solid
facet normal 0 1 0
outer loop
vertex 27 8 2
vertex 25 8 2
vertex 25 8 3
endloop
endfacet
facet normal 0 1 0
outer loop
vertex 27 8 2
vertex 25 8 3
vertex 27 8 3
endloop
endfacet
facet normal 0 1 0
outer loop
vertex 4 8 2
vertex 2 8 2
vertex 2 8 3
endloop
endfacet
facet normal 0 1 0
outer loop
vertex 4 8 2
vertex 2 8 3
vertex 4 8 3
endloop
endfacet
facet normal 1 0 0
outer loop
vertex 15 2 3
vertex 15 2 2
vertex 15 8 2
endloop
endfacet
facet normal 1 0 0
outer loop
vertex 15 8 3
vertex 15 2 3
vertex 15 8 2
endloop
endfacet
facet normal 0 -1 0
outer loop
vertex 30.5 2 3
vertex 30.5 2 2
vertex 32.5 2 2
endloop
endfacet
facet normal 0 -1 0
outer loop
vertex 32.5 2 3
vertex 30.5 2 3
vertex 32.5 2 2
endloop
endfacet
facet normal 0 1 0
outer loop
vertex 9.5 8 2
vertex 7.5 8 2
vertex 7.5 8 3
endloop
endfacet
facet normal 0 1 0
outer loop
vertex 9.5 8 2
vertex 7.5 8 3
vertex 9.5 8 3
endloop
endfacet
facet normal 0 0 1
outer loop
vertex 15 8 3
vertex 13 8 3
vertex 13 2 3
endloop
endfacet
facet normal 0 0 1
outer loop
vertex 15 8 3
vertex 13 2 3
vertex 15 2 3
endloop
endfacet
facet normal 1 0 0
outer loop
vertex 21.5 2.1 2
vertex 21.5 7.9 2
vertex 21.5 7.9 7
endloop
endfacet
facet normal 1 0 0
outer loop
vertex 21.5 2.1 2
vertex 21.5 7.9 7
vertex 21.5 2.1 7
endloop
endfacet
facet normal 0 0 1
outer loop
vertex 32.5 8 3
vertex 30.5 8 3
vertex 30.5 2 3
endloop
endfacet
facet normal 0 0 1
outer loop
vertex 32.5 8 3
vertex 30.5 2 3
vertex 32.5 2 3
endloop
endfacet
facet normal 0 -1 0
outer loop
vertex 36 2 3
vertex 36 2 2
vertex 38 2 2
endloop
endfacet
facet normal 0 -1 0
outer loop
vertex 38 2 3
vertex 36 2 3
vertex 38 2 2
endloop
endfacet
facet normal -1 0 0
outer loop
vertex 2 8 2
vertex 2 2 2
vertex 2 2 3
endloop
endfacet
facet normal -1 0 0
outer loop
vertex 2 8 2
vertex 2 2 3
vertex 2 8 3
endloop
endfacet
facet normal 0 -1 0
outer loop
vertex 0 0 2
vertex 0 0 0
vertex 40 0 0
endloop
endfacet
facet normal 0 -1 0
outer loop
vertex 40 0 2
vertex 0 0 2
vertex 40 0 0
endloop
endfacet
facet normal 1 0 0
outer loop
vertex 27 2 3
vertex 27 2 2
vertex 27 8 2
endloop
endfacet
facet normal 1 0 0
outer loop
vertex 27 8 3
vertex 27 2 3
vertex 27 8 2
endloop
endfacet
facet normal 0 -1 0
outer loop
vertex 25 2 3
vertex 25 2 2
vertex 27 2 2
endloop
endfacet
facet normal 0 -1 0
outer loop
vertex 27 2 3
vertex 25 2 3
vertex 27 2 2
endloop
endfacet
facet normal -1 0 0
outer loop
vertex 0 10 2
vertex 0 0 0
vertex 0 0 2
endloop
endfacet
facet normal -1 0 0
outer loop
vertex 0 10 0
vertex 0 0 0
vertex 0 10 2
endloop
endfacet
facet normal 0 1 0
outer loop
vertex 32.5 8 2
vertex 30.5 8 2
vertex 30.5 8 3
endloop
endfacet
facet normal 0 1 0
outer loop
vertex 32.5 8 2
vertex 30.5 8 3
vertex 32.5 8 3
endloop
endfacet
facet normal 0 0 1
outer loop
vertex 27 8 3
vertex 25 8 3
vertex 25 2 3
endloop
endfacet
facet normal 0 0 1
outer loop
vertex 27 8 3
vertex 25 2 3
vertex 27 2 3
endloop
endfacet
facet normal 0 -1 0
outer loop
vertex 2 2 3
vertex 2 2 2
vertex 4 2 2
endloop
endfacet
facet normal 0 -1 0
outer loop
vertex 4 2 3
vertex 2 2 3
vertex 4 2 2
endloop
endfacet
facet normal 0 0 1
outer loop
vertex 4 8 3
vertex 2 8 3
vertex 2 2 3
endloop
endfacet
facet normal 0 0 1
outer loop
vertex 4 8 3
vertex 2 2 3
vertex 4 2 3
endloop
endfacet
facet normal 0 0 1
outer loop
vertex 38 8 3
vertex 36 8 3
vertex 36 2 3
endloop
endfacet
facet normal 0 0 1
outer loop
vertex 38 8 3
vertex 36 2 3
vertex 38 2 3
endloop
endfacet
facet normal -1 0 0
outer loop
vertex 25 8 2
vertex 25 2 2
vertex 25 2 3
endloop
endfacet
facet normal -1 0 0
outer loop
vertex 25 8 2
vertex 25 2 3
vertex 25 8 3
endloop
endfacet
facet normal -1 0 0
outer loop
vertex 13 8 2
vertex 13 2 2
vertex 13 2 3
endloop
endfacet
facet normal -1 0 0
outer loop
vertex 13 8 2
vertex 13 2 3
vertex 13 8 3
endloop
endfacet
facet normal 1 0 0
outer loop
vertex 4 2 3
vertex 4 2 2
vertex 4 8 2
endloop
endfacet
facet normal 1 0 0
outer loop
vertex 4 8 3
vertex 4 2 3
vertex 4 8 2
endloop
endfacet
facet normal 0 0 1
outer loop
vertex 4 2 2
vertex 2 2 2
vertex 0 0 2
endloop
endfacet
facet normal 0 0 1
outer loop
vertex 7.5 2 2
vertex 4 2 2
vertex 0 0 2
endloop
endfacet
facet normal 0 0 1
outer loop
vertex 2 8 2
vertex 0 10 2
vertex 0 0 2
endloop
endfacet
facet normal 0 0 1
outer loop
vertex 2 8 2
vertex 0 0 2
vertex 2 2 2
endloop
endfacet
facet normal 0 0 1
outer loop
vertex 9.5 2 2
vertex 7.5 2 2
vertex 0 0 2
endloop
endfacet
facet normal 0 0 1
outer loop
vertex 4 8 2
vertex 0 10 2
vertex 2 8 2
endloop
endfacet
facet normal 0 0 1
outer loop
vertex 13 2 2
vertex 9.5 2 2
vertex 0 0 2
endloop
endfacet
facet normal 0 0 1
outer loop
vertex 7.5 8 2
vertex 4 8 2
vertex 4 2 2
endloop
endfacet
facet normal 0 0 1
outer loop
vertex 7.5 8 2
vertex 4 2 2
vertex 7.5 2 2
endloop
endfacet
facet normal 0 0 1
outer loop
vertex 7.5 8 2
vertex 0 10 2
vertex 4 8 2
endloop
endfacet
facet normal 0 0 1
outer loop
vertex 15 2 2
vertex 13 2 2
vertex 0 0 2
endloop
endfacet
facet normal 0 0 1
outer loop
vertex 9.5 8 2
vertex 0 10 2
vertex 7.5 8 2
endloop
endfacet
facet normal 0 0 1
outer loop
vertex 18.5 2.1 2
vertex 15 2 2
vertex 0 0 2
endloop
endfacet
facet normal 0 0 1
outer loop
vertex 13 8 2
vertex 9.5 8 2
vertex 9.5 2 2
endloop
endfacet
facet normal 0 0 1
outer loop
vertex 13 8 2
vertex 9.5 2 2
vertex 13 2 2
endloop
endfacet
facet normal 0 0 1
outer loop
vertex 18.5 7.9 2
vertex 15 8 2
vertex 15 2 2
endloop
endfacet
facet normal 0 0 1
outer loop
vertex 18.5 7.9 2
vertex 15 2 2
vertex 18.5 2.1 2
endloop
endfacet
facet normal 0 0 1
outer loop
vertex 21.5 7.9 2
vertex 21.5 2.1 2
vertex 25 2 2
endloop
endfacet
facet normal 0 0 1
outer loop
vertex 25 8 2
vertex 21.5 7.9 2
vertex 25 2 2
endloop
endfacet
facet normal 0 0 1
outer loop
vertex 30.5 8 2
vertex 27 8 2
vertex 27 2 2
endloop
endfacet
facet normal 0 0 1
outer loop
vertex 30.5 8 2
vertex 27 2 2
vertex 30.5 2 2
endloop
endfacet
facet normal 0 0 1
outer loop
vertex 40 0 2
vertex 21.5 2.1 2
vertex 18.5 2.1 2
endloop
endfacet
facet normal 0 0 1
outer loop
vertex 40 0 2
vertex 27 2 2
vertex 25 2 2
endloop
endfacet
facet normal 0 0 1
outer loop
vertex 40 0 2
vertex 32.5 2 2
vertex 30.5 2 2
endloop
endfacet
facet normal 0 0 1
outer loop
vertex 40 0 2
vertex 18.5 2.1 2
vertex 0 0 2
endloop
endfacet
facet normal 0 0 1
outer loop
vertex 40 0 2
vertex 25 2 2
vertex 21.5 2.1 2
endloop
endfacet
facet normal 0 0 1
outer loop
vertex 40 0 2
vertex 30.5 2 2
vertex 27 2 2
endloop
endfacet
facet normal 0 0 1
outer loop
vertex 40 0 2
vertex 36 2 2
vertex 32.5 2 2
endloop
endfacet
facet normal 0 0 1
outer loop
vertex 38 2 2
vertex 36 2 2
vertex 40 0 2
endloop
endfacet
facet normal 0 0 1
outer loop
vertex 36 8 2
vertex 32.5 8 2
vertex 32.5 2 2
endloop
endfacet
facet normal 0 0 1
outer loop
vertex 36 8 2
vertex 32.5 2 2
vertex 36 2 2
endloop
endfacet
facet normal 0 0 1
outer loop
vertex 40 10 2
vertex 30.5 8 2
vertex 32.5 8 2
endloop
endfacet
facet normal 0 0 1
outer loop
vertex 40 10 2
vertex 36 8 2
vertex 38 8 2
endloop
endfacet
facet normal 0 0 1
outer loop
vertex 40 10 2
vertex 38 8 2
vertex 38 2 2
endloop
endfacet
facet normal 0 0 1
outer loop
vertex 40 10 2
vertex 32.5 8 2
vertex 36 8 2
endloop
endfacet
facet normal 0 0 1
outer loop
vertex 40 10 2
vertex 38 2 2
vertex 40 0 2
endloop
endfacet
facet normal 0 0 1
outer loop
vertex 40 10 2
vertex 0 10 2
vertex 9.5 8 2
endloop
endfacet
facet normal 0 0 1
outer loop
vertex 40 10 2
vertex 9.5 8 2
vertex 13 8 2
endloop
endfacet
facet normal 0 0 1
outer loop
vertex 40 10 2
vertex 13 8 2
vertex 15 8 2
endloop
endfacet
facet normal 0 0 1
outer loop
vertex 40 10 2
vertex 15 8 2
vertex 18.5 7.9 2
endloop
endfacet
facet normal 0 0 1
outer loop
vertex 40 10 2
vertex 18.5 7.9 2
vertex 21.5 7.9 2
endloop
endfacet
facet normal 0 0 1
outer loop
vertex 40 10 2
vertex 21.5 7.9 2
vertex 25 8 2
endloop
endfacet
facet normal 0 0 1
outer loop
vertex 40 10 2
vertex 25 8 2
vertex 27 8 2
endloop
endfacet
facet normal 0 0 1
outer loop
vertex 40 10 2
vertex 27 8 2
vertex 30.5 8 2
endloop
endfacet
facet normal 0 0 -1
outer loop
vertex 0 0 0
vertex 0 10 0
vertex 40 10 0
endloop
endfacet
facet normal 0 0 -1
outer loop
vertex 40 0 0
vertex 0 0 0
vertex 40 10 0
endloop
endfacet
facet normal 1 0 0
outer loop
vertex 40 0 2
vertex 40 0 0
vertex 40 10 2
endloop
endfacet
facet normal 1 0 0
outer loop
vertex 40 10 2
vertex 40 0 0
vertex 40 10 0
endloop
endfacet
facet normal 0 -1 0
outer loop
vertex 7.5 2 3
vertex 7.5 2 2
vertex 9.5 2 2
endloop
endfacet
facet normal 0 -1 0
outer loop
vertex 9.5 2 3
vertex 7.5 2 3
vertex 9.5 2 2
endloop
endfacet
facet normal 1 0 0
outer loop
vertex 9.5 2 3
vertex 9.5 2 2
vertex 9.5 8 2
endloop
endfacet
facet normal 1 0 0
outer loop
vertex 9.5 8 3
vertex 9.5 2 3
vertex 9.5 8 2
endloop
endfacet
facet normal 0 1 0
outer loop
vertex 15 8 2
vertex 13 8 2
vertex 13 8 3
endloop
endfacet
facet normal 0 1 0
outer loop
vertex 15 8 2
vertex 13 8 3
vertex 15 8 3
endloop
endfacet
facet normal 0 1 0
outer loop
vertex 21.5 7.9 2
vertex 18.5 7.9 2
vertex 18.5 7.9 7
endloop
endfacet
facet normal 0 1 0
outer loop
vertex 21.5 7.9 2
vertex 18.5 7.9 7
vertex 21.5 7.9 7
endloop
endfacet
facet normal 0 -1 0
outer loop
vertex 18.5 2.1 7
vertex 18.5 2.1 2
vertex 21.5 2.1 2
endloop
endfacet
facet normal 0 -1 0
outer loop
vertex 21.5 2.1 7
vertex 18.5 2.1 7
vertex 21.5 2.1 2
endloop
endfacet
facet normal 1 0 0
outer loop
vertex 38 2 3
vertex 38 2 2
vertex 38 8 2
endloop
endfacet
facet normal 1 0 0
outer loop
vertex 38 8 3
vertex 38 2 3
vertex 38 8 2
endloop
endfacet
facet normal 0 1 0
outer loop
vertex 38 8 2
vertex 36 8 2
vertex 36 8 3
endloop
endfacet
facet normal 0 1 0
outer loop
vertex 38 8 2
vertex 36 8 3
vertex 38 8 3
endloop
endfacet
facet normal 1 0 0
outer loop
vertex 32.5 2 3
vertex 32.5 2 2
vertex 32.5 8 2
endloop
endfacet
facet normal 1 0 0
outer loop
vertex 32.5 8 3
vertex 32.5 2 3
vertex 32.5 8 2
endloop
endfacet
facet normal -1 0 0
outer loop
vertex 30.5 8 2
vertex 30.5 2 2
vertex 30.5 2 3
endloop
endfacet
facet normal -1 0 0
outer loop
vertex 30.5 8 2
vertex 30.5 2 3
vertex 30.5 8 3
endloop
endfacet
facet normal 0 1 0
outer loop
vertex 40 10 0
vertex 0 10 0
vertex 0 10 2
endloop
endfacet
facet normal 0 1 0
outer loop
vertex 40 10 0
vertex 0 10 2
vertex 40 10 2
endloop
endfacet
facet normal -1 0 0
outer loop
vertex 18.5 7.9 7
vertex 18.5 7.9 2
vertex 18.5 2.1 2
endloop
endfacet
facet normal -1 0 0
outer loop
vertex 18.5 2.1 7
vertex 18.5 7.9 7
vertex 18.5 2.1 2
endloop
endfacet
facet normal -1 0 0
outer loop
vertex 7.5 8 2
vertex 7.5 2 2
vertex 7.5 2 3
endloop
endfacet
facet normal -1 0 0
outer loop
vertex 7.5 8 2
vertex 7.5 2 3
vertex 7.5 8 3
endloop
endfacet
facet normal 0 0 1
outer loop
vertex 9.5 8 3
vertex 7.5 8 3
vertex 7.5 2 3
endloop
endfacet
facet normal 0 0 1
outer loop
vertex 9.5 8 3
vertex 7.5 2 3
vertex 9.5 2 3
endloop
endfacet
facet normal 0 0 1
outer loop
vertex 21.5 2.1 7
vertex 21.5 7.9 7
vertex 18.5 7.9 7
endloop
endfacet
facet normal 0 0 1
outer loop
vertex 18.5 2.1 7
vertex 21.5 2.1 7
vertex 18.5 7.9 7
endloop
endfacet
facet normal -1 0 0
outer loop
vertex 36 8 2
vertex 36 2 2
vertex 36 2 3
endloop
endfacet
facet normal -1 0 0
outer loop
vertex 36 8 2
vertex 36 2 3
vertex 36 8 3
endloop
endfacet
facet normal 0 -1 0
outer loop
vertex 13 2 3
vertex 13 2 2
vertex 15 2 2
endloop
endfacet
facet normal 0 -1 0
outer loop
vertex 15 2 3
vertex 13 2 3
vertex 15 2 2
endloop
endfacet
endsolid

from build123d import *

# Parameters (mm, degrees)
SKETCH_W     = 40
SKETCH_H     = 10
PAD_DEPTH    = 2
PAD001_DEPTH = 5
SKETCH002_W  = 2
SKETCH002_H  = 6
PAD002_DEPTH = 1


with BuildPart() as part:
    # Sketch → Pad (new body)
    with BuildSketch(Plane.XY):
        with Locations((20, 5)):
            Rectangle(SKETCH_W, SKETCH_H)
    extrude(amount=PAD_DEPTH)

    # Sketch001 → Pad001 (new body)
    with BuildSketch(Plane.XY.offset(2)):
        Polygon((18.5, 2.1), (18.5, 5), (18.5, 7.9), (21.5, 7.9), (21.5, 2.1), (20, 2.1), align=None)
    extrude(amount=PAD001_DEPTH)

    # Sketch002 → Pad002 (new body)
    with BuildSketch(Plane.XY.offset(2)):
        with Locations((3, 5)):
            Rectangle(SKETCH002_W, SKETCH002_H)
        with Locations((8.5, 5)):
            Rectangle(SKETCH002_W, SKETCH002_H)
        with Locations((14, 5)):
            Rectangle(SKETCH002_W, SKETCH002_H)
        with Locations((26, 5)):
            Rectangle(SKETCH002_W, SKETCH002_H)
        with Locations((31.5, 5)):
            Rectangle(SKETCH002_W, SKETCH002_H)
        with Locations((37, 5)):
            Rectangle(SKETCH002_W, SKETCH002_H)
    extrude(amount=PAD002_DEPTH)


solid = part.part
